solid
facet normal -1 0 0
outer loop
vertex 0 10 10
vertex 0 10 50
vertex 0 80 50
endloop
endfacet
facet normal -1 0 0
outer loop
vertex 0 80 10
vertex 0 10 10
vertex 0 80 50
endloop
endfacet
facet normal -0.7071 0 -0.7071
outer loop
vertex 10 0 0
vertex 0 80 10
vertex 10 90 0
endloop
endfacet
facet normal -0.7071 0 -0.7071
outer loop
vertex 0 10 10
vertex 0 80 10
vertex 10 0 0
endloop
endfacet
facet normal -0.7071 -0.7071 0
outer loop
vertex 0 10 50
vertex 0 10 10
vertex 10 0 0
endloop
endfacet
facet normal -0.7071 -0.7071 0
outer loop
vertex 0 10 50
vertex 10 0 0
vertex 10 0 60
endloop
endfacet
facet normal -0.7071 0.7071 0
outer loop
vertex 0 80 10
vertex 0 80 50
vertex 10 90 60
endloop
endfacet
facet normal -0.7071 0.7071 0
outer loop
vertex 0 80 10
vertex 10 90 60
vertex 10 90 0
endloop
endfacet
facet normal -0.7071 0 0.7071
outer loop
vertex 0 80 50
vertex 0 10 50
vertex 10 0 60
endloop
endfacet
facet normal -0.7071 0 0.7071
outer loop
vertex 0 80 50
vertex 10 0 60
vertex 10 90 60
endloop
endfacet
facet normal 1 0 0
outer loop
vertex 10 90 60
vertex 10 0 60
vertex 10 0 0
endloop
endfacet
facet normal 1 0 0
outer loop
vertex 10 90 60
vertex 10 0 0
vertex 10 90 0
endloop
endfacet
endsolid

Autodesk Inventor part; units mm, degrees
ref_plane "YZ Plane" through (0, 0, 0) normal (1, 0, 0) x (0, 1, 0)
ref_plane "XZ Plane" through (0, 0, 0) normal (0, 1, 0) x (-1, 0, 0)
ref_plane "XY Plane" through (0, 0, 0) normal (0, 0, 1) x (1, 0, 0)
sketch "Sketch1" plane through (0, 0, 0) normal (1, 0, 0) x (0, 1, 0)
  line L0 (0, 0) -> (90, 0)
  line L1 (90, 0) -> (90, 60)
  line L2 (90, 60) -> (0, 60)
  line L3 (0, 60) -> (0, 0)
  dimension "d0" = 90
  dimension "d1" = 60
extrude "Extrusion1" add sketch "Sketch1" along normal blind 10
chamfer "Chamfer1" distance 10 angle 45 1 edges at (0, 0, 30)
chamfer "Chamfer2" distance 10 angle 45 1 edges at (0, 49.9997, 60)
chamfer "Chamfer3" distance 10 angle 45 1 edges at (0, 90, 25.0003)
chamfer "Chamfer4" distance 10 angle 45 1 edges at (0, 45, 0)
properties part number "pied"
